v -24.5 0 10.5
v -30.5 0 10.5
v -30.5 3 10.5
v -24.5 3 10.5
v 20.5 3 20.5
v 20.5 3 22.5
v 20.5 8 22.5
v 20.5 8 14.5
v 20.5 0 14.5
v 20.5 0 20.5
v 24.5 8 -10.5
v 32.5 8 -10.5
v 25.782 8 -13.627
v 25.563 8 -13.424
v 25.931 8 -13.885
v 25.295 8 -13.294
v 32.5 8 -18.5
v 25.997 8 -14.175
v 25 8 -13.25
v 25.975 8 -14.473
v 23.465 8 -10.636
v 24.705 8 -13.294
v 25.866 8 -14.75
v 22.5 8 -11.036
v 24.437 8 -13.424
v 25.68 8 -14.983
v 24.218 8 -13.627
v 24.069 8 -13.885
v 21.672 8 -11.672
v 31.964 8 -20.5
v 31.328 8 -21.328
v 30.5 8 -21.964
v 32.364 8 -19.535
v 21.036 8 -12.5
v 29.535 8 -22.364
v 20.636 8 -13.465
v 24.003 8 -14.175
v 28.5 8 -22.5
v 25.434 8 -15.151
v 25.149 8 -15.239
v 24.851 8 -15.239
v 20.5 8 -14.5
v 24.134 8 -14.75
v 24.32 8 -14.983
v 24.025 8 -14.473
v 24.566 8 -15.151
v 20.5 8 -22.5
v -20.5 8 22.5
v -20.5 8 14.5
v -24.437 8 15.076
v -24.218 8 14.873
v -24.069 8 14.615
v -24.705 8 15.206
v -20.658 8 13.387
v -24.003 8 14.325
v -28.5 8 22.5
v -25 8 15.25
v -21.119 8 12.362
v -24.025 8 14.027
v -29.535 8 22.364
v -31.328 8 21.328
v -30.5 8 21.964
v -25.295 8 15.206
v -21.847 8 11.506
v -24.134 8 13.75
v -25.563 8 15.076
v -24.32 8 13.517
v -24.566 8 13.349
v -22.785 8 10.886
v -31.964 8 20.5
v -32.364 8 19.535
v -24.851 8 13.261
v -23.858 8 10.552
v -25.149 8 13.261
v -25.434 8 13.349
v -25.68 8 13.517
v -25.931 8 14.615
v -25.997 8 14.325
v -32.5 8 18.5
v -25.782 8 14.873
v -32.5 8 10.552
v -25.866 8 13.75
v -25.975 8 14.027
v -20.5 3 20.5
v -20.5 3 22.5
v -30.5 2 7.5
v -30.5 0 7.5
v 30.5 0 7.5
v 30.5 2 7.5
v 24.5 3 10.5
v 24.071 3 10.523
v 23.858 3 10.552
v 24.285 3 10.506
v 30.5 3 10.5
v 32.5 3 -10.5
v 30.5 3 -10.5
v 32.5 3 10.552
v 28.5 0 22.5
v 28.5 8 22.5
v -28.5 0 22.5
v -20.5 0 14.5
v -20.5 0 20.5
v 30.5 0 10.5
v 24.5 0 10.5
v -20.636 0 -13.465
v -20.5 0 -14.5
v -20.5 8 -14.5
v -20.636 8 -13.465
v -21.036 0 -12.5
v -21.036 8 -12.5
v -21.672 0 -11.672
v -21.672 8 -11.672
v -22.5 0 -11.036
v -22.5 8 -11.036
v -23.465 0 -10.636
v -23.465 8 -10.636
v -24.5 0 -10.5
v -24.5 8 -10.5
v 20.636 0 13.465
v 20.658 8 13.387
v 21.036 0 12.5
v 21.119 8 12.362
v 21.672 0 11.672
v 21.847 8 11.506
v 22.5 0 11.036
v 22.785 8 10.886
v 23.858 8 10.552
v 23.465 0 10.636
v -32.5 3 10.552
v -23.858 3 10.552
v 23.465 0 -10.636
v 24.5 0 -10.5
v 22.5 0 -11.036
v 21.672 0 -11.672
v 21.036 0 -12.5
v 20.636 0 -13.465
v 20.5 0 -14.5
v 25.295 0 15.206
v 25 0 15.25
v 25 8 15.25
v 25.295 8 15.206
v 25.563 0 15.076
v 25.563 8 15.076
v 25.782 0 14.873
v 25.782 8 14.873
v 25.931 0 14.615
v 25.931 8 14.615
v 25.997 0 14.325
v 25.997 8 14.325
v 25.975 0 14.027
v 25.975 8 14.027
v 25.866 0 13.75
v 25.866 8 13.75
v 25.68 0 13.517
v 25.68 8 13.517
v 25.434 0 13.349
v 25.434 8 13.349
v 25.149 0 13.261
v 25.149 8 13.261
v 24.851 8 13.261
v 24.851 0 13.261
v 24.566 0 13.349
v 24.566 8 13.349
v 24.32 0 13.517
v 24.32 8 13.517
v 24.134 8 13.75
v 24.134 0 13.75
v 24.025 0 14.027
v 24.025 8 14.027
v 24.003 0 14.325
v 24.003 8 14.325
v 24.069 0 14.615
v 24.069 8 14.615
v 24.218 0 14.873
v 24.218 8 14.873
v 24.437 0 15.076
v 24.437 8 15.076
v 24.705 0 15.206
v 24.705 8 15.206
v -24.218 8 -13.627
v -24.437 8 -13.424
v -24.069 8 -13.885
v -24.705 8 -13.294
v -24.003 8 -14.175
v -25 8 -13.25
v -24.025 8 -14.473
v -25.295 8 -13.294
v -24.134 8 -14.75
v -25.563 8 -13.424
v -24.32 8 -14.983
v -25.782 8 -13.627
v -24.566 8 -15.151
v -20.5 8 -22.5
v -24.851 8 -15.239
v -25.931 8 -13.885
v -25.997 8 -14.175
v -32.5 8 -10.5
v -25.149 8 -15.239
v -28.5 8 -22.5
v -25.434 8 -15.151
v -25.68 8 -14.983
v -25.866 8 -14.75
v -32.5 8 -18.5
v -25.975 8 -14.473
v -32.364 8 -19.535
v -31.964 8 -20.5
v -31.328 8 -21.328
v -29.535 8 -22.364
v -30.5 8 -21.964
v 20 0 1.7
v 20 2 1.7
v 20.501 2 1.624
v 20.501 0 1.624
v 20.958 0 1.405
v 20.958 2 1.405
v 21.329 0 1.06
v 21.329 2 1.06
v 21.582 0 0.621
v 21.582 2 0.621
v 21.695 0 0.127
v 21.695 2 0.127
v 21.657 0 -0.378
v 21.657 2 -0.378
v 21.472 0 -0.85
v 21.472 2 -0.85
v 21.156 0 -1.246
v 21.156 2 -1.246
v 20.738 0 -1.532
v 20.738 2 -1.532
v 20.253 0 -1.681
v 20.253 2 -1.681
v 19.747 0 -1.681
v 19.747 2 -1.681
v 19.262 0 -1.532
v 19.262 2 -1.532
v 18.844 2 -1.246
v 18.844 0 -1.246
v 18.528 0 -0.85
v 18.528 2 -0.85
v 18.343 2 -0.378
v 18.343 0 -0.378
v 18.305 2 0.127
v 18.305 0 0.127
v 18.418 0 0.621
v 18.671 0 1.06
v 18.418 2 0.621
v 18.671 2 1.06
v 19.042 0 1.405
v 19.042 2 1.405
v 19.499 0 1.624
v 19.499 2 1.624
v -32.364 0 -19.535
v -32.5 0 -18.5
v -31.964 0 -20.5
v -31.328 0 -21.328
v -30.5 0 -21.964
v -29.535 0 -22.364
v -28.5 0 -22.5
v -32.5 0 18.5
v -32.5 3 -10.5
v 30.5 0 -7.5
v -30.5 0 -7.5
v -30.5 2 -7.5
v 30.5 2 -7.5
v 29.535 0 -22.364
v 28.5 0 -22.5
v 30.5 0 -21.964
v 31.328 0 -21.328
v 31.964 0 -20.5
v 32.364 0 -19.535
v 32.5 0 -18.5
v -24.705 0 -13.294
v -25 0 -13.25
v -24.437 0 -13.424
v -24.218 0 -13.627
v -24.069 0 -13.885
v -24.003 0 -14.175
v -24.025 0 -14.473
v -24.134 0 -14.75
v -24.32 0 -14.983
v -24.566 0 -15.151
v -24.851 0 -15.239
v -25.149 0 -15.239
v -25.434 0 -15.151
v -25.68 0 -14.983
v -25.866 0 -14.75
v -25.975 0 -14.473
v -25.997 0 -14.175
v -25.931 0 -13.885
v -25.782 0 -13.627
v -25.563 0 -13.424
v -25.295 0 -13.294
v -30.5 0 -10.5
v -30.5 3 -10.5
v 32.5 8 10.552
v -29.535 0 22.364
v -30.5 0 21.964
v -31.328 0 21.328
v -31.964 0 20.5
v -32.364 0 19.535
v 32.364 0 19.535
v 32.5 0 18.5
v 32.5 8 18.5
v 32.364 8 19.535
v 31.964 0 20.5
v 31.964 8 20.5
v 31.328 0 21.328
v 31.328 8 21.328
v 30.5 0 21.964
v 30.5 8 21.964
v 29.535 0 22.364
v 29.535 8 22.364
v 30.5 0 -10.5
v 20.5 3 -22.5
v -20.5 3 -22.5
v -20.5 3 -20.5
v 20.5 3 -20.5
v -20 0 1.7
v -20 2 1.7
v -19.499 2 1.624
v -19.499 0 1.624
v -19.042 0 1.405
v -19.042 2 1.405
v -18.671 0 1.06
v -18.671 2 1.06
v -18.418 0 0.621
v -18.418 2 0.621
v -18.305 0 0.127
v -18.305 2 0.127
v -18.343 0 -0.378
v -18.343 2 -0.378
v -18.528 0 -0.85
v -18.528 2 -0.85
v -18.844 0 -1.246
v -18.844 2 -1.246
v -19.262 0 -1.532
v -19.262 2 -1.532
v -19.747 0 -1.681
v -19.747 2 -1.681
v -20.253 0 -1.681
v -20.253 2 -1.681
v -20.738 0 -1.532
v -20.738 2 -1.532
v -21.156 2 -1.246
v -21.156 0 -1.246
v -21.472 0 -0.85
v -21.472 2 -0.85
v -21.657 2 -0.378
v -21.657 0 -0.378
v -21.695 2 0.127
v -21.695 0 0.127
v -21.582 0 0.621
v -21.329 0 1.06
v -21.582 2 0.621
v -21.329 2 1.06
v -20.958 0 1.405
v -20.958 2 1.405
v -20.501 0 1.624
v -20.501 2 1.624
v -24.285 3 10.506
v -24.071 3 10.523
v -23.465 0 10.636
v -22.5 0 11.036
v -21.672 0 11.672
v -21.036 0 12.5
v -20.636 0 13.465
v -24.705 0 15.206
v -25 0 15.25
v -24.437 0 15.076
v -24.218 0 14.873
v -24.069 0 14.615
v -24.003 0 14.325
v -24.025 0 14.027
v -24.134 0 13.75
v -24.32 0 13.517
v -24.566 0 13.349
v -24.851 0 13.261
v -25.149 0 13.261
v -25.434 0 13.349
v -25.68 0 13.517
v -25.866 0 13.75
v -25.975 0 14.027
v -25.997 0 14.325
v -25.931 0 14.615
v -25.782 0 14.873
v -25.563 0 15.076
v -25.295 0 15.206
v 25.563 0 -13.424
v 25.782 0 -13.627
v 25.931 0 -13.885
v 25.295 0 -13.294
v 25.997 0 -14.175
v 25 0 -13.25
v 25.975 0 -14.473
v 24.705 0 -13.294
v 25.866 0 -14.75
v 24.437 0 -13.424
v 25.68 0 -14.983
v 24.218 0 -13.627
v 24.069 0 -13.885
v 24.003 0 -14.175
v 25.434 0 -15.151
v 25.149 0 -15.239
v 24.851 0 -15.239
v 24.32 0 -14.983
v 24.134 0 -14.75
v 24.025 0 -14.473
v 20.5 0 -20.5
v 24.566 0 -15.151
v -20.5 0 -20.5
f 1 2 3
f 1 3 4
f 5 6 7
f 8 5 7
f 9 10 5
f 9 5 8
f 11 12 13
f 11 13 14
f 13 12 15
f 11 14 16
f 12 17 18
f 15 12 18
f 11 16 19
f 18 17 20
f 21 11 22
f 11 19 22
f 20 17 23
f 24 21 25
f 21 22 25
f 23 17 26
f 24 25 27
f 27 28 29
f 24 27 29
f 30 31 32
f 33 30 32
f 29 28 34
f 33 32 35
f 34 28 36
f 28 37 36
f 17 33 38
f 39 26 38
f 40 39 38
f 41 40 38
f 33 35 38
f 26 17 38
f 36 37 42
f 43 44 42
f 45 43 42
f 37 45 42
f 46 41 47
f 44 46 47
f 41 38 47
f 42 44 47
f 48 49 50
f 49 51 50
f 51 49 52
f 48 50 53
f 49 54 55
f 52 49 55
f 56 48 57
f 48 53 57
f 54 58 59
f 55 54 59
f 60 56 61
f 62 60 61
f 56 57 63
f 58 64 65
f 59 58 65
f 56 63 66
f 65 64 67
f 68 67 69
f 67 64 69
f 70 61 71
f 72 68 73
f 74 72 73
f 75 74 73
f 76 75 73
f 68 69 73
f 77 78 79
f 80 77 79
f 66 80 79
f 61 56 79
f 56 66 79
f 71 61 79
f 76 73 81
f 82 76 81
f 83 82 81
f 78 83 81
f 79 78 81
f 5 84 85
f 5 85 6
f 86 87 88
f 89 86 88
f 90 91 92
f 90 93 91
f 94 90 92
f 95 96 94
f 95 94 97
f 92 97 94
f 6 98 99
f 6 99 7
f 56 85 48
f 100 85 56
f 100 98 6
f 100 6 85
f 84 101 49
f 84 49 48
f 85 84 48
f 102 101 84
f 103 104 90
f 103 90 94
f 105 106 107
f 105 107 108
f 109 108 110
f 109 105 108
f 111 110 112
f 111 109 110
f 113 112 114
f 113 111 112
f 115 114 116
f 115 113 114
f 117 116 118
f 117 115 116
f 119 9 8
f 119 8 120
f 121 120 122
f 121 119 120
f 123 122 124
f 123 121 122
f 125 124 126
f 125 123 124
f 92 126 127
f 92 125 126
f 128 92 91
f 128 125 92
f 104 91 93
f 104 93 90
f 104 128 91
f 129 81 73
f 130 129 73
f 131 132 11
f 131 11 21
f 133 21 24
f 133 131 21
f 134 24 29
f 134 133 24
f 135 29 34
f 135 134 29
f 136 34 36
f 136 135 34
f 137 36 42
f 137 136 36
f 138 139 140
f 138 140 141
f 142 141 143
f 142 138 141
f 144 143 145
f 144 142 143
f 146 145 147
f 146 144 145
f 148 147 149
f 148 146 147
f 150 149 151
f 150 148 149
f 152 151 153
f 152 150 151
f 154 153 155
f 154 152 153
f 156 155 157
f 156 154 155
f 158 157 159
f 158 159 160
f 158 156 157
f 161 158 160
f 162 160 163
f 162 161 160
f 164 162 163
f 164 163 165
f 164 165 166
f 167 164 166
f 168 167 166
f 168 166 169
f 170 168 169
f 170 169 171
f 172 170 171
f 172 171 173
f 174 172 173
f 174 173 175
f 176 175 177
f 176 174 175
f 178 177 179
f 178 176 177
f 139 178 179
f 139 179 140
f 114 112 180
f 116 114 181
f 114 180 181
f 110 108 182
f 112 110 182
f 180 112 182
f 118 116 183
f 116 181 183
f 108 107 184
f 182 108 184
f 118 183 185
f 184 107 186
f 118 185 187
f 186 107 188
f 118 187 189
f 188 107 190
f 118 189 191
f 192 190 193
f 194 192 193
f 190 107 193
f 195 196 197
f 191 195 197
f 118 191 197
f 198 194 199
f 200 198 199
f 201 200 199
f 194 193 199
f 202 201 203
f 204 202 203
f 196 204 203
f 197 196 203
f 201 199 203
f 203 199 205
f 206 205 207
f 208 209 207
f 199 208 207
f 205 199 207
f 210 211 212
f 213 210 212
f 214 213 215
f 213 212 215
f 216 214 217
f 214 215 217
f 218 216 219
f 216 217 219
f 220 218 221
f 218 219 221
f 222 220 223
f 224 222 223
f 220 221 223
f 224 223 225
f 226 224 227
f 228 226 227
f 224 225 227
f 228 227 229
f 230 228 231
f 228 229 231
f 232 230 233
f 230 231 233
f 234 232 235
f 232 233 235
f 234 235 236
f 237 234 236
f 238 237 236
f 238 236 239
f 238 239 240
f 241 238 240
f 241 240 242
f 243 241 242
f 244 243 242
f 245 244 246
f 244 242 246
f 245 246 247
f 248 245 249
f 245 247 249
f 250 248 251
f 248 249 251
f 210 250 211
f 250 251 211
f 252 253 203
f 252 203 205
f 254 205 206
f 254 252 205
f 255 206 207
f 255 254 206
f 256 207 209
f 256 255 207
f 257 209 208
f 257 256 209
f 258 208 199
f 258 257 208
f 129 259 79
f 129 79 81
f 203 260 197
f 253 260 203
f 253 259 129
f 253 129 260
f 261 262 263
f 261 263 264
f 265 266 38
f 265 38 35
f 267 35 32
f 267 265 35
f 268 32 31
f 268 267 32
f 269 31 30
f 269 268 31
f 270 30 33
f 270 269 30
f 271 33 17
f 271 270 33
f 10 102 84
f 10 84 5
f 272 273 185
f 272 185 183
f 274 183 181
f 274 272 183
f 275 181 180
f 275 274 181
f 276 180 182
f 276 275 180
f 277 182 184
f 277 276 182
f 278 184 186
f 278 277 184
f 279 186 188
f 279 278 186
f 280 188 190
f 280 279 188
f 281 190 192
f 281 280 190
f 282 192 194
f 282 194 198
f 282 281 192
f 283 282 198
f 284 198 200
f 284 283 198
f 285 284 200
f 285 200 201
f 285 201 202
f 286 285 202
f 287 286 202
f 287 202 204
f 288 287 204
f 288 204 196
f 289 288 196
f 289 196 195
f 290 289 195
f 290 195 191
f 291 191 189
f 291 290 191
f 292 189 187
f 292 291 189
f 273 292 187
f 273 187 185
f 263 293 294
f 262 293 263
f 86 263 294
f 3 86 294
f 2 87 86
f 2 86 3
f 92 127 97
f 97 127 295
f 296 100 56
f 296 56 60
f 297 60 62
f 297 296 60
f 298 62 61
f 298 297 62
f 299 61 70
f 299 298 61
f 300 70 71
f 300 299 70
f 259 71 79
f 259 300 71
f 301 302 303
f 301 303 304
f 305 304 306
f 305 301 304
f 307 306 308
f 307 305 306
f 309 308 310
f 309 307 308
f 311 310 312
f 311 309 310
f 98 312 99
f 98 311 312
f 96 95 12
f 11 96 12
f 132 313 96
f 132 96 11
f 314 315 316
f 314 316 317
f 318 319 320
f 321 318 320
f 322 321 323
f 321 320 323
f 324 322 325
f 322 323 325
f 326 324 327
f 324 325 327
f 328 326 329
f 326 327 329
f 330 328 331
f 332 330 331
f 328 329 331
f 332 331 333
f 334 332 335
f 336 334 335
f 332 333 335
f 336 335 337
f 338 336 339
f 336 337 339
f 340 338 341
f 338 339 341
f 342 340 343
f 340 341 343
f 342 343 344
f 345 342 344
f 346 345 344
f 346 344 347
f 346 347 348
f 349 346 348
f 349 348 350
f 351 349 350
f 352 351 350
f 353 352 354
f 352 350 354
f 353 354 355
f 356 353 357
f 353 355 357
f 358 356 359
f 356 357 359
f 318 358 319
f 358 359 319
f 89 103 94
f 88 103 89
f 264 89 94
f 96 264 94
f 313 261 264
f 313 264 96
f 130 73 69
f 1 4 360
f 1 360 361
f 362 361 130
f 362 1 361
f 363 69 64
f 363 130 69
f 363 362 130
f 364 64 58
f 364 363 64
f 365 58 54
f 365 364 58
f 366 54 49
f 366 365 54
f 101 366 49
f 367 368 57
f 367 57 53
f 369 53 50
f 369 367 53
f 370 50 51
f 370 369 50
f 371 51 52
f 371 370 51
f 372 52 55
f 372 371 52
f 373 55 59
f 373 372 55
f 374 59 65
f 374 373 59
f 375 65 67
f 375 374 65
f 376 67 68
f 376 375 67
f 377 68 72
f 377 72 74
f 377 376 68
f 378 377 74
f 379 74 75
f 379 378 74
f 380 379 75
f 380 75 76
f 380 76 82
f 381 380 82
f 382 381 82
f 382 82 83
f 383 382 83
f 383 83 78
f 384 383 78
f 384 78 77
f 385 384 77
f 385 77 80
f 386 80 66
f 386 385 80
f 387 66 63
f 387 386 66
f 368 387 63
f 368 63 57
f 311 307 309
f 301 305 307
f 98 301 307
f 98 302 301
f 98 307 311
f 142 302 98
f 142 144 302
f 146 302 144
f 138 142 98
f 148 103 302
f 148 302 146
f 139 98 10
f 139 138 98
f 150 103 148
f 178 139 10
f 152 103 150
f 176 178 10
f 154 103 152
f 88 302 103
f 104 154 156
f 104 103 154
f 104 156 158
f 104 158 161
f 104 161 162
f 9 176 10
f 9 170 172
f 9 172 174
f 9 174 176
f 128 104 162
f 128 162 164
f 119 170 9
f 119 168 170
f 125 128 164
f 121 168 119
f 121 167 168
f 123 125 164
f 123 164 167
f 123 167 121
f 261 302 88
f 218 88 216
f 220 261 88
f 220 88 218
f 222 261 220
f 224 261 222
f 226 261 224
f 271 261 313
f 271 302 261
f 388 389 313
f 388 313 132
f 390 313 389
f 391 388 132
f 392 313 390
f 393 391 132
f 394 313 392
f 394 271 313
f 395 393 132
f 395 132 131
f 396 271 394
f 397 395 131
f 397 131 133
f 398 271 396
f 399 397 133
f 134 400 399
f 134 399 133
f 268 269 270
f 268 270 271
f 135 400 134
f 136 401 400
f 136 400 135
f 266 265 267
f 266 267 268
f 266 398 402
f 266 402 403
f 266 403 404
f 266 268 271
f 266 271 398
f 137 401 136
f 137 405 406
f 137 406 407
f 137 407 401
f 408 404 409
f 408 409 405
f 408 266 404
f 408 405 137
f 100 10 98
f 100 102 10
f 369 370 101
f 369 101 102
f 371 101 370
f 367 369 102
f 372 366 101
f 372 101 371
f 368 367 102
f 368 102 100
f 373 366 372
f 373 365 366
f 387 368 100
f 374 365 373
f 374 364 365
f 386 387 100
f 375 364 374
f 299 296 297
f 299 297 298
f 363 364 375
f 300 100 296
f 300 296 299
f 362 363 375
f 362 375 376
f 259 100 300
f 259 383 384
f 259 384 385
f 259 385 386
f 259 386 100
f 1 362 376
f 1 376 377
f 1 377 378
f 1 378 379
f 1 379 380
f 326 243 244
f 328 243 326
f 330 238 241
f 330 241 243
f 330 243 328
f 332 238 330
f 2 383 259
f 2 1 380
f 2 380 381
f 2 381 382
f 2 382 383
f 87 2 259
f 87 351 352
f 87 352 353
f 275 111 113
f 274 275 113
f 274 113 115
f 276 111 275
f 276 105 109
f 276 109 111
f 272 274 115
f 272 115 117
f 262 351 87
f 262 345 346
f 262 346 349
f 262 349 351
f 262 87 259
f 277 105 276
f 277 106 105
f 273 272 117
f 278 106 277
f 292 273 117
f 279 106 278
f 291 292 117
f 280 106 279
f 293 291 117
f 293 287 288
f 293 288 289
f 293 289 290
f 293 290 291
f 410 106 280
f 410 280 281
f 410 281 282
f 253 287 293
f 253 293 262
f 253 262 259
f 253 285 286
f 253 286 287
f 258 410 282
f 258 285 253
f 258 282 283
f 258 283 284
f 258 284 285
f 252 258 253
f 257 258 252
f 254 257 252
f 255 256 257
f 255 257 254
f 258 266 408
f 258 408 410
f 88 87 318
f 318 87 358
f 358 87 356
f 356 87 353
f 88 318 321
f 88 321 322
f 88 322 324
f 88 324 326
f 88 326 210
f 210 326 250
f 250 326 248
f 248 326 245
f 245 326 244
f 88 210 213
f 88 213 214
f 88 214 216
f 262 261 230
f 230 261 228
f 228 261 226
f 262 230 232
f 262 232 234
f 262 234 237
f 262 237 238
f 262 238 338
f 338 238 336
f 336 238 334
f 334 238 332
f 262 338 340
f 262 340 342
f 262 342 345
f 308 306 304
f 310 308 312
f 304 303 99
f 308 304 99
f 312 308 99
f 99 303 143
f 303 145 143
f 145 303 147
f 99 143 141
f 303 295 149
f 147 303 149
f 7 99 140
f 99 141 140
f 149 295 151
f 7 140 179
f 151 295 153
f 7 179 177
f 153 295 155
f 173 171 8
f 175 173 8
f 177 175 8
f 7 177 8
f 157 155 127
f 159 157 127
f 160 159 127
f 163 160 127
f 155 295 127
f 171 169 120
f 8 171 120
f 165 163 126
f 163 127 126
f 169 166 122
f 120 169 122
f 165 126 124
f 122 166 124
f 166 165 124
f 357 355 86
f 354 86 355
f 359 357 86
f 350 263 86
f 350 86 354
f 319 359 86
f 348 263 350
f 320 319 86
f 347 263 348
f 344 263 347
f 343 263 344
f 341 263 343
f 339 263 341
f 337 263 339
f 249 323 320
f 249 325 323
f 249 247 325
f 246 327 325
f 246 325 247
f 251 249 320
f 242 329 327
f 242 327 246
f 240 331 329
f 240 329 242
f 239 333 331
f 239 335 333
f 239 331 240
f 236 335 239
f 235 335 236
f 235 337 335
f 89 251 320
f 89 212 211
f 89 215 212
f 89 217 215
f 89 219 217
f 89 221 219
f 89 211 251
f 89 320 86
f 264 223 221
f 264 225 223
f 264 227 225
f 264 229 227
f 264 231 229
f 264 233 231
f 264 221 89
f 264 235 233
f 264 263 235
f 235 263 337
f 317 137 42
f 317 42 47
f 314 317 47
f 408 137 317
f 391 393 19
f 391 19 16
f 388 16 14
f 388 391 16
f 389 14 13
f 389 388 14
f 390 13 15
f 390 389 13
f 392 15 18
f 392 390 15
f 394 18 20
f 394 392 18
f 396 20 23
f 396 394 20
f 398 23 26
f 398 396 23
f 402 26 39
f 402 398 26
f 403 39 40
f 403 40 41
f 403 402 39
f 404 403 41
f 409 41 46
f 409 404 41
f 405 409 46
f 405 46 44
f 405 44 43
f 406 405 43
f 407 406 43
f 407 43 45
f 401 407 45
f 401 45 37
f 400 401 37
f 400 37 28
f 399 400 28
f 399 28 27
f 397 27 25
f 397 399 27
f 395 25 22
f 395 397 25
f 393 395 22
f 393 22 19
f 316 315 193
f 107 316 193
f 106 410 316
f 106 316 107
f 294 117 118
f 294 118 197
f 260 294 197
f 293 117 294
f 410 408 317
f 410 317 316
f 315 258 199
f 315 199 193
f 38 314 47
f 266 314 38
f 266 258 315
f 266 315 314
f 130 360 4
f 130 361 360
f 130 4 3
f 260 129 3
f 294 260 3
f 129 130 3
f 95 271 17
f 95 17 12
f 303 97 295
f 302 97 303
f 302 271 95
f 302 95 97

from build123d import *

# Parameters (mm, degrees)
SKETCH1_R           = 1
BOSS_EXTRUDE1_DEPTH = 8
SKETCH2_W           = 63
SKETCH2_H           = 15
BOSS_EXTRUDE2_DEPTH = 2
SKETCH3_R           = 1.7
CUT_EXTRUDE1_DEPTH  = 2
SKETCH4_W           = 41
SKETCH4_H           = 45
CUT_EXTRUDE2_DEPTH  = 5
SKETCH5_W           = 65
SKETCH5_H           = 21.051864014
CUT_EXTRUDE3_DEPTH  = 5


with BuildPart() as part:
    # Sketch1 → Boss-Extrude1 (new body)
    with BuildSketch(Plane(origin=(0, 0, 0), x_dir=(1, 0, 0), z_dir=(0, 1, 0))):
        with BuildLine():
            Line((-28.5, 22.5), (28.5, 22.5))
            ThreePointArc((28.5, 22.5), (31.328427125, 21.328427125), (32.5, 18.5))
            Line((32.5, 18.5), (32.5, -18.5))
            ThreePointArc((32.5, -18.5), (31.328427125, -21.328427125), (28.5, -22.5))
            Line((28.5, -22.5), (-28.5, -22.5))
            ThreePointArc((-28.5, -22.5), (-31.328427125, -21.328427125), (-32.5, -18.5))
            Line((-32.5, -18.5), (-32.5, 18.5))
            ThreePointArc((-32.5, 18.5), (-31.328427125, 21.328427125), (-28.5, 22.5))
        make_face()
        with Locations(Location((-25, 14.25, 0), (0, 0, 270))):
            Circle(SKETCH1_R, mode=Mode.SUBTRACT)
        with Locations(Location((25, 14.25, 0), (0, 0, 270))):
            Circle(SKETCH1_R, mode=Mode.SUBTRACT)
        with Locations(Location((25, -14.25, 0), (0, 0, 270))):
            Circle(SKETCH1_R, mode=Mode.SUBTRACT)
        with Locations(Location((-25, -14.25, 0), (0, 0, 270))):
            Circle(SKETCH1_R, mode=Mode.SUBTRACT)
        with BuildLine():
            Line((-30.5, 10.5), (-30.5, -10.5))
            Line((-30.5, -10.5), (-24.5, -10.5))
            ThreePointArc((-24.5, -10.5), (-21.671572875, -11.671572875), (-20.5, -14.5))
            Line((-20.5, -14.5), (-20.5, -20.5))
            Line((-20.5, -20.5), (20.5, -20.5))
            Line((20.5, -20.5), (20.5, -14.5))
            ThreePointArc((20.5, -14.5), (21.671572875, -11.671572875), (24.5, -10.5))
            Line((24.5, -10.5), (30.5, -10.5))
            Line((30.5, -10.5), (30.5, 10.5))
            Line((30.5, 10.5), (24.5, 10.5))
            ThreePointArc((24.5, 10.5), (21.671572875, 11.671572875), (20.5, 14.5))
            Line((20.5, 14.5), (20.5, 20.5))
            Line((20.5, 20.5), (-20.5, 20.5))
            Line((-20.5, 20.5), (-20.5, 14.5))
            ThreePointArc((-20.5, 14.5), (-21.671572875, 11.671572875), (-24.5, 10.5))
            Line((-24.5, 10.5), (-30.5, 10.5))
        make_face(mode=Mode.SUBTRACT)
    extrude(amount=BOSS_EXTRUDE1_DEPTH)

    # Sketch2 → Boss-Extrude2 (add)
    with BuildSketch(Plane(origin=(0, 0, 0), x_dir=(1, 0, 0), z_dir=(0, 1, 0))):
        Rectangle(SKETCH2_W, SKETCH2_H)
    extrude(amount=BOSS_EXTRUDE2_DEPTH)

    # Sketch3 → Cut-Extrude1 (cut)
    with BuildSketch(Plane(origin=(0, 2, 0), x_dir=(1, 0, 0), z_dir=(0, 1, 0))):
        with Locations(Location((-20, 0, 0), (0, 0, 270))):
            Circle(SKETCH3_R)
        with Locations(Location((20, 0, 0), (0, 0, 270))):
            Circle(SKETCH3_R)
    extrude(amount=-CUT_EXTRUDE1_DEPTH, mode=Mode.SUBTRACT)

    # Sketch4 → Cut-Extrude2 (cut)
    with BuildSketch(Plane(origin=(0, 8, 0), x_dir=(1, 0, 0), z_dir=(0, 1, 0))):
        Rectangle(SKETCH4_W, SKETCH4_H)
    extrude(amount=-CUT_EXTRUDE2_DEPTH, mode=Mode.SUBTRACT)

    # Sketch5 → Cut-Extrude3 (cut)
    with BuildSketch(Plane(origin=(0, 8, 0), x_dir=(1, 0, 0), z_dir=(0, 1, 0))):
        with Locations((0, -0.025932007)):
            Rectangle(SKETCH5_W, SKETCH5_H)
    extrude(amount=-CUT_EXTRUDE3_DEPTH, mode=Mode.SUBTRACT)


solid = part.part
